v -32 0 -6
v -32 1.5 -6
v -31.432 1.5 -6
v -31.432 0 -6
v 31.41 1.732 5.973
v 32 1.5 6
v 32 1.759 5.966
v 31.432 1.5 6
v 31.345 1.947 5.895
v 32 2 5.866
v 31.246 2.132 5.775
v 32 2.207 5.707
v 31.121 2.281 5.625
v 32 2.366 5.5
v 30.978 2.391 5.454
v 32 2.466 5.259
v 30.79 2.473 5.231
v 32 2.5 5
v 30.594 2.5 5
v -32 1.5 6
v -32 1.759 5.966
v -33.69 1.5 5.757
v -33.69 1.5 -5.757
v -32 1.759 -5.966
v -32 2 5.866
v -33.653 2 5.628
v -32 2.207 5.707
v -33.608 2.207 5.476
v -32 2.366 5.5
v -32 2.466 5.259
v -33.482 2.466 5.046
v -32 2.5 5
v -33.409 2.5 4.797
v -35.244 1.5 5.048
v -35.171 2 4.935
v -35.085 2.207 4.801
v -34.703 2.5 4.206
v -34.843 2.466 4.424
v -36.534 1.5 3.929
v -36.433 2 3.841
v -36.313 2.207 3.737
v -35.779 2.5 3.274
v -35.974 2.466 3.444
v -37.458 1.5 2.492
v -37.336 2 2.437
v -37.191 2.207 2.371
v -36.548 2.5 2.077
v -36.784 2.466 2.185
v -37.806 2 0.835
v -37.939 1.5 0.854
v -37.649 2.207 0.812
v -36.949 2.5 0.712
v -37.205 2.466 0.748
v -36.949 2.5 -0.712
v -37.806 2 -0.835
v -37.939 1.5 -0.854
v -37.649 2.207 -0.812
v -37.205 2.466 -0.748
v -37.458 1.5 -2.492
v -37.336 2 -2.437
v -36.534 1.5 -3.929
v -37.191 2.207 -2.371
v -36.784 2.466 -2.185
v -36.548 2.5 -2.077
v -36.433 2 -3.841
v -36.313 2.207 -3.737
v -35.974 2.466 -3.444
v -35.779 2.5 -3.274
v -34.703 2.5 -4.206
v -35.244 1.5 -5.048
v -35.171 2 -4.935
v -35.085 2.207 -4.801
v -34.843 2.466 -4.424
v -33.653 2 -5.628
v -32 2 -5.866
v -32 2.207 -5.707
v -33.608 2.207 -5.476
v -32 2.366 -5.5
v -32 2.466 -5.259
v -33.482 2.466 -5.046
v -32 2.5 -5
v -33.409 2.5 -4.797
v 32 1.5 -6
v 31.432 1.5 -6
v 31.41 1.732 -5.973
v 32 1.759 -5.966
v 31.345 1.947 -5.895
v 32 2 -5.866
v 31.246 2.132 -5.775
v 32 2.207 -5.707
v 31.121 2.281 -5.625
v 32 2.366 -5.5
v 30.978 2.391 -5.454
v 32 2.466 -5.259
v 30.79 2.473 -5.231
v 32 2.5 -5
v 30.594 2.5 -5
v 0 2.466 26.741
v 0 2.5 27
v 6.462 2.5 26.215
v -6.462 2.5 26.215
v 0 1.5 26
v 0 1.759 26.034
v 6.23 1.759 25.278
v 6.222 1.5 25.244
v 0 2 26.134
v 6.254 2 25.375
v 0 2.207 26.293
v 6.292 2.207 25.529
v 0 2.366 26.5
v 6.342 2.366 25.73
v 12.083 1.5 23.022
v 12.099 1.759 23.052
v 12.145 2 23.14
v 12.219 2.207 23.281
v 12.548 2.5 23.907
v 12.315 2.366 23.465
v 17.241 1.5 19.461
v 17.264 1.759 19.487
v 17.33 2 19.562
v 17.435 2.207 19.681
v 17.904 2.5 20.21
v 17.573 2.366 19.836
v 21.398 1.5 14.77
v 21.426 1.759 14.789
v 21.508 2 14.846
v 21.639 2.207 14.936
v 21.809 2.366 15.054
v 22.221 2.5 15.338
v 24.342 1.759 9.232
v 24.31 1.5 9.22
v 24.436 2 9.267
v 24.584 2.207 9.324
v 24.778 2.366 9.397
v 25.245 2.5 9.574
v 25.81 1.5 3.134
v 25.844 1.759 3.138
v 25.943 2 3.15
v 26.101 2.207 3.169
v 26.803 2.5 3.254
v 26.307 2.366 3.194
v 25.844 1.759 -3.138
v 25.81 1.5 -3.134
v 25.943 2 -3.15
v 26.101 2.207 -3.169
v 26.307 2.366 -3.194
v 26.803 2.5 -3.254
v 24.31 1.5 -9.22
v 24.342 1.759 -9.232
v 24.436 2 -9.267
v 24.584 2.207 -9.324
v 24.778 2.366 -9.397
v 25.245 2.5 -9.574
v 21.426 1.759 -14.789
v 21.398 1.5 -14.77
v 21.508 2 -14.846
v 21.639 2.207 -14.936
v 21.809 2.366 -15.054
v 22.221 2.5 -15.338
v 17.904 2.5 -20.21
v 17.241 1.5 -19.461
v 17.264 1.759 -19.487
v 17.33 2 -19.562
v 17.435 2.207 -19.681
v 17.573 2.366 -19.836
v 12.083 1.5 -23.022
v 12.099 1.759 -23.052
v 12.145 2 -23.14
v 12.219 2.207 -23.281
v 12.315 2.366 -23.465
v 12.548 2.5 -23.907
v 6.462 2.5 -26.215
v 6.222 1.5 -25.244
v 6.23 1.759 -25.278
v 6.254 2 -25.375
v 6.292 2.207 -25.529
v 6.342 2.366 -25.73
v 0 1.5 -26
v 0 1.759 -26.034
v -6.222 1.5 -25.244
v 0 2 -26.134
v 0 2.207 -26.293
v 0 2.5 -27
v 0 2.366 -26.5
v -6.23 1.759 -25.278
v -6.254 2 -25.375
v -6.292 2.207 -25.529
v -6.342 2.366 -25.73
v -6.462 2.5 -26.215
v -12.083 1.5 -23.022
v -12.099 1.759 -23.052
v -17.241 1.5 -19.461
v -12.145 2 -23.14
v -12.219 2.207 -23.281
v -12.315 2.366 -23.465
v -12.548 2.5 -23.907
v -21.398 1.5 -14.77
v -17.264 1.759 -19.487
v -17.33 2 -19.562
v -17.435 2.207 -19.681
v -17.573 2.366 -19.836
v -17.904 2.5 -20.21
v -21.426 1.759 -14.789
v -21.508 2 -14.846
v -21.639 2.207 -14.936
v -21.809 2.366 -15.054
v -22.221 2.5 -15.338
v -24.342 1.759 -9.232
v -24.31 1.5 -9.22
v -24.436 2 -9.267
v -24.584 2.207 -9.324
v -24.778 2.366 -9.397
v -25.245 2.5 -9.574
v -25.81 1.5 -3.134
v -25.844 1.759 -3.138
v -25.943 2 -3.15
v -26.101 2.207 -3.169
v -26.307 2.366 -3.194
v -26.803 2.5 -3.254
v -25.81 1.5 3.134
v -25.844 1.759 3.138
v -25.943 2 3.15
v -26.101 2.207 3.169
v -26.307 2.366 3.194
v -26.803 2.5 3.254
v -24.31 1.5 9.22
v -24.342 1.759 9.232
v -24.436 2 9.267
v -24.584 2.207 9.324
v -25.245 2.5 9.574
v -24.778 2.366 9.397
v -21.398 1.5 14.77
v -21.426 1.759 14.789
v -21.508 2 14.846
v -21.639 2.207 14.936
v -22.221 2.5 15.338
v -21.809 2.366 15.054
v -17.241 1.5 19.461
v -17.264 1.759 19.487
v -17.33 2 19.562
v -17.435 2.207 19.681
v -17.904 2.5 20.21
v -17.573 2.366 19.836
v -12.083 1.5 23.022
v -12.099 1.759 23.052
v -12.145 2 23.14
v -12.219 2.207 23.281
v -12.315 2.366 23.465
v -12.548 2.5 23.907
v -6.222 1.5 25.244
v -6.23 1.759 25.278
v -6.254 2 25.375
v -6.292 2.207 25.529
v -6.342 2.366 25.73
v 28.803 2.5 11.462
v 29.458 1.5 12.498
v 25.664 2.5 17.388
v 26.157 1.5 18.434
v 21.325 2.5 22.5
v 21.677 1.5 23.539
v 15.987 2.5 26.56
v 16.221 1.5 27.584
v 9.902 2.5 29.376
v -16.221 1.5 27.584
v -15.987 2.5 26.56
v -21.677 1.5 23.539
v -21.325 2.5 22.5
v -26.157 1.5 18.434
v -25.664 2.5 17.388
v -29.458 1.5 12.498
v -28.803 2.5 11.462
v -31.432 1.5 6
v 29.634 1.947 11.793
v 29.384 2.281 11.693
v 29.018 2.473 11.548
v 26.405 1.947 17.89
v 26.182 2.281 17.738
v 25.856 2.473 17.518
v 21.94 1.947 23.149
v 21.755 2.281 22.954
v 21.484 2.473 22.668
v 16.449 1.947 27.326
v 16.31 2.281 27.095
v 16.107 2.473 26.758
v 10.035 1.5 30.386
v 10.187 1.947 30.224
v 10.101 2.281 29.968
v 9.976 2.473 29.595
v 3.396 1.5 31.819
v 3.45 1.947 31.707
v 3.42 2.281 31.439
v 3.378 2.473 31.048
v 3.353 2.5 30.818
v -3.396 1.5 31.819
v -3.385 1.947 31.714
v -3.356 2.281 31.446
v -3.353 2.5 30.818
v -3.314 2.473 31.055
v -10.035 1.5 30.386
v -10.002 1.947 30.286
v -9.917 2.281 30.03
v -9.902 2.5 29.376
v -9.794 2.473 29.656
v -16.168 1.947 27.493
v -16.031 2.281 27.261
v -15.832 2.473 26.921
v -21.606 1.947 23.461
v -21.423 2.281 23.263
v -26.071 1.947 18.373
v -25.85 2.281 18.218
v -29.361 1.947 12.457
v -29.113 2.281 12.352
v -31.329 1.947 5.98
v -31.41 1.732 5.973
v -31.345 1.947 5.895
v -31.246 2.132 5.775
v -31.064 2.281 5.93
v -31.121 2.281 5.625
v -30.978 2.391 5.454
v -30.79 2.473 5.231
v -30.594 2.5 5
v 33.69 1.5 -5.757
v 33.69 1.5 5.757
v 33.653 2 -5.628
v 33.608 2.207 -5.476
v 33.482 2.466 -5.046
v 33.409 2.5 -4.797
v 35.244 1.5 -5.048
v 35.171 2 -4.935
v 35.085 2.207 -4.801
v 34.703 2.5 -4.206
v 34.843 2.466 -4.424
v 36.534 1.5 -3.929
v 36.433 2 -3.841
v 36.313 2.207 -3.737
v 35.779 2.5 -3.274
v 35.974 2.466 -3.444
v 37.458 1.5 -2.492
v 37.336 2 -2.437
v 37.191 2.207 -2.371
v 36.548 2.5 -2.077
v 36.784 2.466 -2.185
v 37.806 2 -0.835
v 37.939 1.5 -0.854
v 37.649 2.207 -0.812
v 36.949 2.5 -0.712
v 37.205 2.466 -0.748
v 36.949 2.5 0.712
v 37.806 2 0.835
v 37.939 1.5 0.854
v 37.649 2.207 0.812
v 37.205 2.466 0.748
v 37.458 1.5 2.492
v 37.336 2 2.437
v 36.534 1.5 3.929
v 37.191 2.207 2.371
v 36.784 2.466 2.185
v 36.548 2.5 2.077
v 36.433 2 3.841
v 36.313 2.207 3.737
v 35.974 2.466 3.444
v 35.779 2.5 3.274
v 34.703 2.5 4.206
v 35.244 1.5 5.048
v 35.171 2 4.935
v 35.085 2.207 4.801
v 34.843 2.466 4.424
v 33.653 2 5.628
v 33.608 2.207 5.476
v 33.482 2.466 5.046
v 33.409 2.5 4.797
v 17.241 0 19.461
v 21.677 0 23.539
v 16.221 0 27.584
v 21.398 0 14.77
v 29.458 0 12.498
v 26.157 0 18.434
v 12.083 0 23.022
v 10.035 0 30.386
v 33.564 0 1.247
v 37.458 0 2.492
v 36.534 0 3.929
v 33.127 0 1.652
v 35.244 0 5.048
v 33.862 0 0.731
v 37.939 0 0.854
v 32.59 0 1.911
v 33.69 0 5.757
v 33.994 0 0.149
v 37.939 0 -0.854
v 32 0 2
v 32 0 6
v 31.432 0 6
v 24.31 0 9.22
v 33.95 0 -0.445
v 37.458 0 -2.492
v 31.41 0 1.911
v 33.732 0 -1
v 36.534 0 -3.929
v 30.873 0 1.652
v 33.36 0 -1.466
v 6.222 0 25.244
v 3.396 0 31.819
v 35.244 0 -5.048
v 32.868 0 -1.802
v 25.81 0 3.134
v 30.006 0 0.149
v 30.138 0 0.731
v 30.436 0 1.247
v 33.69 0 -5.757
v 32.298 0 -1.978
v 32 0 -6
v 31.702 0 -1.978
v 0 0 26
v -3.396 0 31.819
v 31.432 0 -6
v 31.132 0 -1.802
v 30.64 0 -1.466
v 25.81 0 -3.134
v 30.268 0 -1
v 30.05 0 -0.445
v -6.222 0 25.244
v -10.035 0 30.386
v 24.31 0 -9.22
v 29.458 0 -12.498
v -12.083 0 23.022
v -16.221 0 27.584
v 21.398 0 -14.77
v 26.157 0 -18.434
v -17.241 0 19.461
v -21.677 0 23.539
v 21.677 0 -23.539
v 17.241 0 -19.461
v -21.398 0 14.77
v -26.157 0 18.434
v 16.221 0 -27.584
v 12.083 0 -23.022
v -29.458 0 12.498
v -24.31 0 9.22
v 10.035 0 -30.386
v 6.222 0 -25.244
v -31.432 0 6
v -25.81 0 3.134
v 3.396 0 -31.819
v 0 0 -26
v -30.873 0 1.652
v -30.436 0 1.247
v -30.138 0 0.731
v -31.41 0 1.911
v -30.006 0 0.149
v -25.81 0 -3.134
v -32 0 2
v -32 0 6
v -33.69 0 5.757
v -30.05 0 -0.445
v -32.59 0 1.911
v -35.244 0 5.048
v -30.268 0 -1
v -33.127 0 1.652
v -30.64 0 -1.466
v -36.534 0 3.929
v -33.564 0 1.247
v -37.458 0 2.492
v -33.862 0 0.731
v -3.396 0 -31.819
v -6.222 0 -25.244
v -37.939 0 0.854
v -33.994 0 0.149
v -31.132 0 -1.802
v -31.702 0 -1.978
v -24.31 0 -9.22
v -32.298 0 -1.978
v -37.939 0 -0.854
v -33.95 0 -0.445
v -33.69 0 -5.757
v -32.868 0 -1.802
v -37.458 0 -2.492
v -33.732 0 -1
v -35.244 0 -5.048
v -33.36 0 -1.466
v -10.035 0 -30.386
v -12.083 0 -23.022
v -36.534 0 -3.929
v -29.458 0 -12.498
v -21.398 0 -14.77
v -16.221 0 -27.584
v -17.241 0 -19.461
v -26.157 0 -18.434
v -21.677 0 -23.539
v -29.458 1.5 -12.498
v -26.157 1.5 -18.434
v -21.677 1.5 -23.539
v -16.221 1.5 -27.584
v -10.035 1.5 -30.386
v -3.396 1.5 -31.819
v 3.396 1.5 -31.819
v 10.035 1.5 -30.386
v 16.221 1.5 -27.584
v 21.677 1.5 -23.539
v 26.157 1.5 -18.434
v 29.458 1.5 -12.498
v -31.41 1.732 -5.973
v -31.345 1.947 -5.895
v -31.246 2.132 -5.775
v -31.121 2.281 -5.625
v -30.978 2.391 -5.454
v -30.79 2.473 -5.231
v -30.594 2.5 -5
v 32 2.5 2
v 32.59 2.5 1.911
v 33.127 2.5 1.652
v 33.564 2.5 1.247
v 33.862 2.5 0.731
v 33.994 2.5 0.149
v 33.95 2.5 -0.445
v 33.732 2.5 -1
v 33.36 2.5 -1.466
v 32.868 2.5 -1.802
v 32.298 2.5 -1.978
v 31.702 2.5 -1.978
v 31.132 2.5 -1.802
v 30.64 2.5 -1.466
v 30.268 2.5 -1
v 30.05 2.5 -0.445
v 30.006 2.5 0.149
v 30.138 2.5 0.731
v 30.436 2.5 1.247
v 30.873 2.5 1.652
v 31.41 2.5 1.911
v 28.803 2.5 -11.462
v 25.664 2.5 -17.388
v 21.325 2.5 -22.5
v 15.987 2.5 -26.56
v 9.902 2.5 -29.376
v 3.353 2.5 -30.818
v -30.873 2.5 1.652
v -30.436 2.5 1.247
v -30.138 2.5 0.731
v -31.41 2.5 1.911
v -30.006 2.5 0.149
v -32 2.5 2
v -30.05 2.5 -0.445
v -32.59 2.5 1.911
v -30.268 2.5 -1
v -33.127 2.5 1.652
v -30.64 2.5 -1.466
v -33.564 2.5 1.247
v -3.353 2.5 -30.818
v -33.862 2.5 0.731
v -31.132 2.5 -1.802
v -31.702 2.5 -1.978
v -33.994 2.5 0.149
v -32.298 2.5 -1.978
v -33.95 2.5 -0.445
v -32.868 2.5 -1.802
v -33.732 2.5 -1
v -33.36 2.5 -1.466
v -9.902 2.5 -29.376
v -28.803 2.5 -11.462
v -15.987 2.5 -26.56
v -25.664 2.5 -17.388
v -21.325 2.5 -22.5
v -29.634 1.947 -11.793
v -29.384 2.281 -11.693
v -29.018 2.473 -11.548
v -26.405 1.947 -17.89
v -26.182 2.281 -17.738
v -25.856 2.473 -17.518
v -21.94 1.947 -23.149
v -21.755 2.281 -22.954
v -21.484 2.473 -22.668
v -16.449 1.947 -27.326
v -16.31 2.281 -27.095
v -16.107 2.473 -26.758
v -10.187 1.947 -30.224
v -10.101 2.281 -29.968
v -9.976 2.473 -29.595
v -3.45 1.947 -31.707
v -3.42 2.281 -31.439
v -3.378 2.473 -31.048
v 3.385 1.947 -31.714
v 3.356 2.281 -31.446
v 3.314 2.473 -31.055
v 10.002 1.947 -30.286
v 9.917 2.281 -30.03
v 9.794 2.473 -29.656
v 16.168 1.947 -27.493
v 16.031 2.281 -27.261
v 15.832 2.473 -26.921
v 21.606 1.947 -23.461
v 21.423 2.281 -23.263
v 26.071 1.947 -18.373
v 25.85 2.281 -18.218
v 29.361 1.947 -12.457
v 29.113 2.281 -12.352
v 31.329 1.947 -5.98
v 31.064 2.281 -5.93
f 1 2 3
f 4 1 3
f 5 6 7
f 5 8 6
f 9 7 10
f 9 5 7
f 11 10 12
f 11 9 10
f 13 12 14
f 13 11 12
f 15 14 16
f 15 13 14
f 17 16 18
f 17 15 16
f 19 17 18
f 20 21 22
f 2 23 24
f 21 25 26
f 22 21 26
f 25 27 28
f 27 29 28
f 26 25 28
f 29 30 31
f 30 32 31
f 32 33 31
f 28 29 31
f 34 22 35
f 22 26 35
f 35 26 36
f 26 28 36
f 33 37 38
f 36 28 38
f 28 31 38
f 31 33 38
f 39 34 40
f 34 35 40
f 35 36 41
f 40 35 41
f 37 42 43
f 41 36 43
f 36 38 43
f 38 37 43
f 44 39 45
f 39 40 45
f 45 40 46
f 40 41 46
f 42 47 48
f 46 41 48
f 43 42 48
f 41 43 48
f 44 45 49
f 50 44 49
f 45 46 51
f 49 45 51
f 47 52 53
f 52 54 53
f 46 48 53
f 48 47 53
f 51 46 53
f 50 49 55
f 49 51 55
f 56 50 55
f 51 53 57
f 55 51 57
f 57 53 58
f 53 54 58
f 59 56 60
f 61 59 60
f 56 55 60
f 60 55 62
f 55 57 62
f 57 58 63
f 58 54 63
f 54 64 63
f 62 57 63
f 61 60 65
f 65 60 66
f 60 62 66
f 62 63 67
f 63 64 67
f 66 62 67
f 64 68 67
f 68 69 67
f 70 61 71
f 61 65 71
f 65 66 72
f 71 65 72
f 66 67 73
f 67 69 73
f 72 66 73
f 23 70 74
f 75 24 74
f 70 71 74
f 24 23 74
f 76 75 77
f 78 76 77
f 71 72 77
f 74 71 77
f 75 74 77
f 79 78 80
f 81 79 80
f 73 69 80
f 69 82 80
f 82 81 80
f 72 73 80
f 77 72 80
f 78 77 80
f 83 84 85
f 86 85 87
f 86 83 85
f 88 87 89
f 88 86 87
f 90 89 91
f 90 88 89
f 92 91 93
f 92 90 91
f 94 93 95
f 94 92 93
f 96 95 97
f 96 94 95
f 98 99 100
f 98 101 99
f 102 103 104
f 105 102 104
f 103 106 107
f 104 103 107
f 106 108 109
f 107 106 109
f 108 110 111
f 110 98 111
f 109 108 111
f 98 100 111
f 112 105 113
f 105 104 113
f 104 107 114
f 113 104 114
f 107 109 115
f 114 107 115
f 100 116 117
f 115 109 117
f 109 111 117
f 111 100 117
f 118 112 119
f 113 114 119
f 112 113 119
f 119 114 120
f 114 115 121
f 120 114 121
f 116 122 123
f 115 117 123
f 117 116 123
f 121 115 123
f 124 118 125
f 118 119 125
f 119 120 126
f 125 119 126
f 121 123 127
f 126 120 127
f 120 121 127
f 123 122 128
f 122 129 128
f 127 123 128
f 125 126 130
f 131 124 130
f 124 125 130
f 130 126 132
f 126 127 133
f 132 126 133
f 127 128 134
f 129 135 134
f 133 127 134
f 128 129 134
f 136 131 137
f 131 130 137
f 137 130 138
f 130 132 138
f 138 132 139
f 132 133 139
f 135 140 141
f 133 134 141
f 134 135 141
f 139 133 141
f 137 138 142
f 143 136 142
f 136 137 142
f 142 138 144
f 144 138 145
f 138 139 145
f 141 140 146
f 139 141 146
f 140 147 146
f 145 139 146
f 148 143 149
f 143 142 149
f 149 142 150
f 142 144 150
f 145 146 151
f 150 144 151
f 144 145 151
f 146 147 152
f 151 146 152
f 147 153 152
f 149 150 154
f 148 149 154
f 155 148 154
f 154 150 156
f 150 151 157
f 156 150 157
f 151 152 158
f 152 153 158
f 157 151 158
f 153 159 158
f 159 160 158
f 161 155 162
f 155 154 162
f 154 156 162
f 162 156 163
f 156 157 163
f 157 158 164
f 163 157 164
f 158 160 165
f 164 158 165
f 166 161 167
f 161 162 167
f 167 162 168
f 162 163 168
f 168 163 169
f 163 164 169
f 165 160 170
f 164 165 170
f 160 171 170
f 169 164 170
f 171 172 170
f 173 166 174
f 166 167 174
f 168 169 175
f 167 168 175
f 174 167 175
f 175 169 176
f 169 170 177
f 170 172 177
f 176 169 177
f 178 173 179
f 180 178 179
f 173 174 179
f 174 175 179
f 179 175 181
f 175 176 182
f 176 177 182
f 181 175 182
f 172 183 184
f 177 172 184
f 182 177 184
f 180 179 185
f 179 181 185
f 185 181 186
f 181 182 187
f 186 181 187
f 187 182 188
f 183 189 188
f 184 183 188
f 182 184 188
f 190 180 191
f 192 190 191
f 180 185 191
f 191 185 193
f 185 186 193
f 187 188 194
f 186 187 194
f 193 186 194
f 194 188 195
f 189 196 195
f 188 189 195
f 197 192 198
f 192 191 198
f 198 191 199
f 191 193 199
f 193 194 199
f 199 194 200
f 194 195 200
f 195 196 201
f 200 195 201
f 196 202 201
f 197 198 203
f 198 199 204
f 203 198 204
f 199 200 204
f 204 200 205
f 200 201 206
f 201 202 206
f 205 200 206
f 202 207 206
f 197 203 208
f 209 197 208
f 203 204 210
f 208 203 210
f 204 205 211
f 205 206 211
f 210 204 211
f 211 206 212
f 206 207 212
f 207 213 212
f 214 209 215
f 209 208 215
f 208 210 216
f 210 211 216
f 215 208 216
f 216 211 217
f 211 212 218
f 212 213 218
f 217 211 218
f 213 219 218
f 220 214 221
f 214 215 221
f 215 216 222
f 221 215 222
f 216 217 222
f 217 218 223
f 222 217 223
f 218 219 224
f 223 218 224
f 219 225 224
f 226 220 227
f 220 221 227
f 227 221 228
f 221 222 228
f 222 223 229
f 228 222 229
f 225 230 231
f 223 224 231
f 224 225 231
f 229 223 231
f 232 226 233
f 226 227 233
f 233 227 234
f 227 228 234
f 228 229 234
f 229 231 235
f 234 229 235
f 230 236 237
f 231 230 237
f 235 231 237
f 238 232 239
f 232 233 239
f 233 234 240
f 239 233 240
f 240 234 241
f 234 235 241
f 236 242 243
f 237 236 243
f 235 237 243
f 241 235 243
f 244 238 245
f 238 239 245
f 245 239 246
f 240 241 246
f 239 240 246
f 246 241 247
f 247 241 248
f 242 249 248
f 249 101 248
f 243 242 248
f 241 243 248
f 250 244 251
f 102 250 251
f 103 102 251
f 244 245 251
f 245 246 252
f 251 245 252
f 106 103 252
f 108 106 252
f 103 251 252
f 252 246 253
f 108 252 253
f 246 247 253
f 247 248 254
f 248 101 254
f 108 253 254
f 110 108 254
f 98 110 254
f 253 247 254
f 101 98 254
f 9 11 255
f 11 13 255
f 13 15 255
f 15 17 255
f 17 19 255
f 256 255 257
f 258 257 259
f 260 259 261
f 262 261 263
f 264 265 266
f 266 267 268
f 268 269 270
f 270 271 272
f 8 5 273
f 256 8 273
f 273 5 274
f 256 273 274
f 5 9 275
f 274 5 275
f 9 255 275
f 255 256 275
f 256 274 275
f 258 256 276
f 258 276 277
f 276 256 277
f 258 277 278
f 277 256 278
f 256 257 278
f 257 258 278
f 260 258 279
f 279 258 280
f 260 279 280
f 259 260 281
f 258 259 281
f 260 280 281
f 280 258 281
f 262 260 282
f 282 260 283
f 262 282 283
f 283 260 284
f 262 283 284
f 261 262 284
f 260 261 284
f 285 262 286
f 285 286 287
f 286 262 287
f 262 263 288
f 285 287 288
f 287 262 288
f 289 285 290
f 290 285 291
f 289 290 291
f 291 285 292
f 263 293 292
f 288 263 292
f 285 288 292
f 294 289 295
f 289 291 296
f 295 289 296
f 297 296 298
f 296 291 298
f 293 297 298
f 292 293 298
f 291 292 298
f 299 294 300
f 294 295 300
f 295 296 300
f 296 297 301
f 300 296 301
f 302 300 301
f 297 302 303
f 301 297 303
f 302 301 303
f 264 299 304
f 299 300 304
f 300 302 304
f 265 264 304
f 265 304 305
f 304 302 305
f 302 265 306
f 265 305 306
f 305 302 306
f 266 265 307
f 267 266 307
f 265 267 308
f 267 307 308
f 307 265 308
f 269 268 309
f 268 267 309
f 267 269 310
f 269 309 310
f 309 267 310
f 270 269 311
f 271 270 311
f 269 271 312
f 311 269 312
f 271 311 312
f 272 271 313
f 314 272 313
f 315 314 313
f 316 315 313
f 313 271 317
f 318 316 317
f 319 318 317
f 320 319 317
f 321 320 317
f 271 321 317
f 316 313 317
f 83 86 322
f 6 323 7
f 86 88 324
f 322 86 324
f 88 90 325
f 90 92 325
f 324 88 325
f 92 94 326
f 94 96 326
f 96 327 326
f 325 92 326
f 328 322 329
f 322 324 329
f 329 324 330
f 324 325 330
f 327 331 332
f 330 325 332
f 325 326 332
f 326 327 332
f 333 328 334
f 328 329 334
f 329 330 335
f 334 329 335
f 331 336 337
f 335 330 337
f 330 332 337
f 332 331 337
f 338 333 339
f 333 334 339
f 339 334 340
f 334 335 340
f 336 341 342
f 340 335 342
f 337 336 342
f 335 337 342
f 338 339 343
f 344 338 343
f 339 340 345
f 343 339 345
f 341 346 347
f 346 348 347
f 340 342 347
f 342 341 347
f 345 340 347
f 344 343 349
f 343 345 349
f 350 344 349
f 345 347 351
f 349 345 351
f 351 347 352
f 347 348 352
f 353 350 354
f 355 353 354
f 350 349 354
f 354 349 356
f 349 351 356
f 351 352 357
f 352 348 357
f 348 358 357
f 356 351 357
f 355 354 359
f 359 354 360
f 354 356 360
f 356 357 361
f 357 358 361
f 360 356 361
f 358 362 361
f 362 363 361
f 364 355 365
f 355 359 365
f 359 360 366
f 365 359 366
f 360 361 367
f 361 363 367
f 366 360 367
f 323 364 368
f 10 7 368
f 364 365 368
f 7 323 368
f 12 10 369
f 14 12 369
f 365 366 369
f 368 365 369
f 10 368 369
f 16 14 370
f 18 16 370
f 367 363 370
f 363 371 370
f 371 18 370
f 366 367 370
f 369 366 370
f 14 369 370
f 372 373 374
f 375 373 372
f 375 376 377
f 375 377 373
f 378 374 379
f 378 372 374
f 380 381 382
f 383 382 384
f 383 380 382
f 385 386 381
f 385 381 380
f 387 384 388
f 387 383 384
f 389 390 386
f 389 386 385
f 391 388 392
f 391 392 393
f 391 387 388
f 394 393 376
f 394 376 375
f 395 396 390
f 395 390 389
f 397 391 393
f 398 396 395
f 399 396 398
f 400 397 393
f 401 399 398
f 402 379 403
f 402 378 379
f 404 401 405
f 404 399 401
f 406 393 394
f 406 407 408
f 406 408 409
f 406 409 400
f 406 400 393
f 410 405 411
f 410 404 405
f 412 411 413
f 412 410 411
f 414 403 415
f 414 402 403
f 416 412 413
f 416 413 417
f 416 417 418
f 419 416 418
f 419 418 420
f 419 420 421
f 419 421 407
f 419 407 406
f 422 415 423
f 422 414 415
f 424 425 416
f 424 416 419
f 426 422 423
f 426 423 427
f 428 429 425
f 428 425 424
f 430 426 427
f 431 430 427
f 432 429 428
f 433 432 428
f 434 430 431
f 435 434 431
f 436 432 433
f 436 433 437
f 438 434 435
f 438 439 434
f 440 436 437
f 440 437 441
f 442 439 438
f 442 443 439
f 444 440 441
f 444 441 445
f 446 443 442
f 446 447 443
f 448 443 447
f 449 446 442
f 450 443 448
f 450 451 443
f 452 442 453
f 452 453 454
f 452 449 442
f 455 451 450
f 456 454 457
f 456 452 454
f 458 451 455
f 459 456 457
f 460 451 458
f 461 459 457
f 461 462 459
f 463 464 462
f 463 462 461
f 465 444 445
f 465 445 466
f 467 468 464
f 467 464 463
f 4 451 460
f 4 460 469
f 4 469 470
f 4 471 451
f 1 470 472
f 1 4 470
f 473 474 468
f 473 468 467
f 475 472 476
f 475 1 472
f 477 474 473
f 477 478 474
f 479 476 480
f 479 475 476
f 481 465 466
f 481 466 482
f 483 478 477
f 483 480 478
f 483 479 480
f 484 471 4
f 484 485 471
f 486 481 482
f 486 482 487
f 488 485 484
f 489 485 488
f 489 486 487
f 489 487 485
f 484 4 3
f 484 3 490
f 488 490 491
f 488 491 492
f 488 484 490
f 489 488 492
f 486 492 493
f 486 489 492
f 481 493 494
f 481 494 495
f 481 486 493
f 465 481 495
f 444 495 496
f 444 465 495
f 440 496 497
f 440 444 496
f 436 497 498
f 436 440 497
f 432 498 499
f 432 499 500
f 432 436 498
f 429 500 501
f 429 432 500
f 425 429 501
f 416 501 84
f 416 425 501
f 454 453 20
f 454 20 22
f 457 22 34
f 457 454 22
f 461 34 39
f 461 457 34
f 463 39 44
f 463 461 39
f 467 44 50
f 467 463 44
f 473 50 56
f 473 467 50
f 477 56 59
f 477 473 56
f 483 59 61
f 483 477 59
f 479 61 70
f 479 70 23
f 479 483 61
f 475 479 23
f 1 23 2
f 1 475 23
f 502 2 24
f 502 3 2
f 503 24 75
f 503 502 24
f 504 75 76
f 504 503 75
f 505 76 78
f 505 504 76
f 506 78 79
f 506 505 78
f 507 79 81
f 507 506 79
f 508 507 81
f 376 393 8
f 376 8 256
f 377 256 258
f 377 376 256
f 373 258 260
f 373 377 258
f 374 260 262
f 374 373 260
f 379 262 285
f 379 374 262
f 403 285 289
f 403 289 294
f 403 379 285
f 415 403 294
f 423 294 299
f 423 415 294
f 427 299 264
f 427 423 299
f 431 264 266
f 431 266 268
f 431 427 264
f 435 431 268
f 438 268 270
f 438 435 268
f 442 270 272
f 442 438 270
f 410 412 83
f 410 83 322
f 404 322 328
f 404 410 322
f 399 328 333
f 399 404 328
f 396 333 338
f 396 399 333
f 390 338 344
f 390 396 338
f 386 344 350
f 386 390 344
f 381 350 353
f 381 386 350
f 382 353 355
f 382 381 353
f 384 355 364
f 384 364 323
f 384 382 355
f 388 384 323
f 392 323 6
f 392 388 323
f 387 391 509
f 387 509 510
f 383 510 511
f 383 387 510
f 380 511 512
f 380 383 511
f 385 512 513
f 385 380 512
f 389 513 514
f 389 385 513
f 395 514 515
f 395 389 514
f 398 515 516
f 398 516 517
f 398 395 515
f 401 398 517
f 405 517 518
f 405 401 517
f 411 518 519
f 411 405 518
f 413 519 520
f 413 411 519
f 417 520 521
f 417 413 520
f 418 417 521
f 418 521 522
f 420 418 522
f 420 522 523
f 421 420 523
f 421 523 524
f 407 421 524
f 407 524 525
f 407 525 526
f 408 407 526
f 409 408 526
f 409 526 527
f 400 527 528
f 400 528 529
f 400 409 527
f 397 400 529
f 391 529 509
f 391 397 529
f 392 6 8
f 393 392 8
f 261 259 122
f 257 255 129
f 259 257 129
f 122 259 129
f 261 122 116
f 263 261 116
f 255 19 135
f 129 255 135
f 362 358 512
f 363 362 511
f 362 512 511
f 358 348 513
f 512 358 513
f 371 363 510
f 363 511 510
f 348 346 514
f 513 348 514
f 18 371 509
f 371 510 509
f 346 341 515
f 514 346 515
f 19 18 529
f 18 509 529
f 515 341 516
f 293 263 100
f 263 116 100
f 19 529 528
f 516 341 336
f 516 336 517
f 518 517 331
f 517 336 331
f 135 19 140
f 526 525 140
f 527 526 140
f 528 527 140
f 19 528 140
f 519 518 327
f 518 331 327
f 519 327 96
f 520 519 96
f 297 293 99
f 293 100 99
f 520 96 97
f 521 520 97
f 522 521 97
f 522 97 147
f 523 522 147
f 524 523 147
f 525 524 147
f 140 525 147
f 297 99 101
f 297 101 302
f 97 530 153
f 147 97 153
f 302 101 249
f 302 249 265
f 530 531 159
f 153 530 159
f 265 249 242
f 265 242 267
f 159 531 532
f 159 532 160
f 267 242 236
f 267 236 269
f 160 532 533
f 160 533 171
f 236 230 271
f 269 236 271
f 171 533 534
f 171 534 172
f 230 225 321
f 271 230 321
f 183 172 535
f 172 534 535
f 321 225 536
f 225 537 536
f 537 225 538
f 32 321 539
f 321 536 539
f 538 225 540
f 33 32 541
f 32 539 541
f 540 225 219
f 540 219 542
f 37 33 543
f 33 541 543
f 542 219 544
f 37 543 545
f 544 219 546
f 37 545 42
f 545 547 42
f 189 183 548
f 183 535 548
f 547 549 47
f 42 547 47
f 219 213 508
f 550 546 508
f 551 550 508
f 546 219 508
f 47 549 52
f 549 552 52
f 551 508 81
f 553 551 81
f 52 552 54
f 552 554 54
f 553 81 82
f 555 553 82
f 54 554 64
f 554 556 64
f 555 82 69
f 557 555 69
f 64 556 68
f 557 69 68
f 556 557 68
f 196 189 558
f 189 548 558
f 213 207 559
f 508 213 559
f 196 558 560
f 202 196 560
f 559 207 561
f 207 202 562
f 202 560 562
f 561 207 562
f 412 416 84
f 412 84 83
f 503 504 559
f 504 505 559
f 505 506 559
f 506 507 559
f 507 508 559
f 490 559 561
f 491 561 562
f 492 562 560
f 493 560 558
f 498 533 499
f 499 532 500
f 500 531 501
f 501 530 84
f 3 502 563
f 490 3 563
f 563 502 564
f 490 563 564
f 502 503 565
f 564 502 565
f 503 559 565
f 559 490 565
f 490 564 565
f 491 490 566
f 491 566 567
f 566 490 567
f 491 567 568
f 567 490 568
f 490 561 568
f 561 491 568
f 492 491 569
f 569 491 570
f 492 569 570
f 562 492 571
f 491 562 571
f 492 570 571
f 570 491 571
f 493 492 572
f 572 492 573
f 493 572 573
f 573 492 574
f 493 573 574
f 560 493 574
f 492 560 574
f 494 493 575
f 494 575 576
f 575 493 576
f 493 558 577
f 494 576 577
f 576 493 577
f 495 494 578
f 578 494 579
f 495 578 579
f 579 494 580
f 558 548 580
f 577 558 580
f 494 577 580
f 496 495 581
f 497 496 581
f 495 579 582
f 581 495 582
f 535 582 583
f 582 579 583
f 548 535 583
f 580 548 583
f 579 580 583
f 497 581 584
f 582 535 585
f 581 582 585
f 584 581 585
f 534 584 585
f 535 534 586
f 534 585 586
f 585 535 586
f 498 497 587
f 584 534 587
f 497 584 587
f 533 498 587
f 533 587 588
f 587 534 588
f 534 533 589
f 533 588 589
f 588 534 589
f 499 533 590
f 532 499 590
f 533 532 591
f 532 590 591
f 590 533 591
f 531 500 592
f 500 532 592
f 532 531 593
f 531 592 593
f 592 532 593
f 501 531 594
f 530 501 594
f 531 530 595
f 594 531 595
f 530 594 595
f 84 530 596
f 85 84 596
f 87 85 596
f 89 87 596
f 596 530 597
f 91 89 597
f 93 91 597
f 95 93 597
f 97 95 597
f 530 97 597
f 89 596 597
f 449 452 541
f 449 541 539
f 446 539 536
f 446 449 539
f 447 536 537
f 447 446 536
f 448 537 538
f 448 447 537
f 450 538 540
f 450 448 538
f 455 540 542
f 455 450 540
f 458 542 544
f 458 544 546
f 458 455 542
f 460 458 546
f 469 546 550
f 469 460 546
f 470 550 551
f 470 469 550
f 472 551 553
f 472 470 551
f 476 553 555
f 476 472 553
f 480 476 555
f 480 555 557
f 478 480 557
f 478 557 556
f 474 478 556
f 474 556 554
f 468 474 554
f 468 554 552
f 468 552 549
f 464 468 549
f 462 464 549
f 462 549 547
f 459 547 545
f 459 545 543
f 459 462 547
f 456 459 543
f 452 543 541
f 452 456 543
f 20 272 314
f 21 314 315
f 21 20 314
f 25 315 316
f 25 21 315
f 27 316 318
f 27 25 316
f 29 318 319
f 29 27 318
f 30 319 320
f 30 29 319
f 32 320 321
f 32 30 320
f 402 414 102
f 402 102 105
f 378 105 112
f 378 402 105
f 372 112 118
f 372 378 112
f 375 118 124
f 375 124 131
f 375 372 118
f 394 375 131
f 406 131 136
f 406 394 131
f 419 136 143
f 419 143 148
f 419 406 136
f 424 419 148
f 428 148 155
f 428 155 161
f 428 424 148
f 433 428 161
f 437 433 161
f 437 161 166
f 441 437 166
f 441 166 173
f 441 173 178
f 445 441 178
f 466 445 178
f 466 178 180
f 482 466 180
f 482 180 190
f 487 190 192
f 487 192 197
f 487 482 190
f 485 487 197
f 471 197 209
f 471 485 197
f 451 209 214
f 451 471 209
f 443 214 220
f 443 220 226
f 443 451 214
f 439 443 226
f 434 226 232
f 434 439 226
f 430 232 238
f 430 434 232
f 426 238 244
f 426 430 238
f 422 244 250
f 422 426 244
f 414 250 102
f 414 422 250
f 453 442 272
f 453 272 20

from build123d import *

# Parameters (mm, degrees)
CROQUIS1_R              = 26
CROQUIS1_R_2            = 2
SALIENTE_EXTRUIR1_DEPTH = 2.5
REDONDEO1_R             = 1


with BuildPart() as part:
    # Croquis1 → Saliente-Extruir1 (new body)
    with BuildSketch(Plane(origin=(0, 0, 0), x_dir=(1, 0, 0), z_dir=(0, 1, 0))):
        with BuildLine():
            Line((-32, 6), (-31.432467291, 6))
            ThreePointArc((-31.432467291, 6), (0, 32), (31.432467291, 6))
            Line((31.432467291, 6), (32, 6))
            ThreePointArc((32, 6), (38, 0), (32, -6))
            Line((32, -6), (31.432467291, -6))
            ThreePointArc((31.432467291, -6), (0, -32), (-31.432467291, -6))
            Line((-31.432467291, -6), (-32, -6))
            ThreePointArc((-32, -6), (-38, 0), (-32, 6))
        make_face()
        with Locations(Location((0, 0, 0), (0, 0, 270))):
            Circle(CROQUIS1_R, mode=Mode.SUBTRACT)
        with Locations(Location((-32, 0, 0), (0, 0, 270))):
            Circle(CROQUIS1_R_2, mode=Mode.SUBTRACT)
        with Locations(Location((32, 0, 0), (0, 0, 270))):
            Circle(CROQUIS1_R_2, mode=Mode.SUBTRACT)
    extrude(amount=SALIENTE_EXTRUIR1_DEPTH)

    # Redondeo1
    redondeo1_edges = [part.edges().sort_by_distance(p)[0] for p in [
        (0, 2.5, -32),
        (-31.716233646, 2.5, -6),
        (-38, 2.5, 0),
        (0, 2.5, -26),
        (-31.716233646, 2.5, 6),
        (0, 2.5, 32),
        (31.716233646, 2.5, 6),
        (38, 2.5, 0),
        (31.716233646, 2.5, -6),
    ]]
    fillet(redondeo1_edges, radius=REDONDEO1_R)


solid = part.part
